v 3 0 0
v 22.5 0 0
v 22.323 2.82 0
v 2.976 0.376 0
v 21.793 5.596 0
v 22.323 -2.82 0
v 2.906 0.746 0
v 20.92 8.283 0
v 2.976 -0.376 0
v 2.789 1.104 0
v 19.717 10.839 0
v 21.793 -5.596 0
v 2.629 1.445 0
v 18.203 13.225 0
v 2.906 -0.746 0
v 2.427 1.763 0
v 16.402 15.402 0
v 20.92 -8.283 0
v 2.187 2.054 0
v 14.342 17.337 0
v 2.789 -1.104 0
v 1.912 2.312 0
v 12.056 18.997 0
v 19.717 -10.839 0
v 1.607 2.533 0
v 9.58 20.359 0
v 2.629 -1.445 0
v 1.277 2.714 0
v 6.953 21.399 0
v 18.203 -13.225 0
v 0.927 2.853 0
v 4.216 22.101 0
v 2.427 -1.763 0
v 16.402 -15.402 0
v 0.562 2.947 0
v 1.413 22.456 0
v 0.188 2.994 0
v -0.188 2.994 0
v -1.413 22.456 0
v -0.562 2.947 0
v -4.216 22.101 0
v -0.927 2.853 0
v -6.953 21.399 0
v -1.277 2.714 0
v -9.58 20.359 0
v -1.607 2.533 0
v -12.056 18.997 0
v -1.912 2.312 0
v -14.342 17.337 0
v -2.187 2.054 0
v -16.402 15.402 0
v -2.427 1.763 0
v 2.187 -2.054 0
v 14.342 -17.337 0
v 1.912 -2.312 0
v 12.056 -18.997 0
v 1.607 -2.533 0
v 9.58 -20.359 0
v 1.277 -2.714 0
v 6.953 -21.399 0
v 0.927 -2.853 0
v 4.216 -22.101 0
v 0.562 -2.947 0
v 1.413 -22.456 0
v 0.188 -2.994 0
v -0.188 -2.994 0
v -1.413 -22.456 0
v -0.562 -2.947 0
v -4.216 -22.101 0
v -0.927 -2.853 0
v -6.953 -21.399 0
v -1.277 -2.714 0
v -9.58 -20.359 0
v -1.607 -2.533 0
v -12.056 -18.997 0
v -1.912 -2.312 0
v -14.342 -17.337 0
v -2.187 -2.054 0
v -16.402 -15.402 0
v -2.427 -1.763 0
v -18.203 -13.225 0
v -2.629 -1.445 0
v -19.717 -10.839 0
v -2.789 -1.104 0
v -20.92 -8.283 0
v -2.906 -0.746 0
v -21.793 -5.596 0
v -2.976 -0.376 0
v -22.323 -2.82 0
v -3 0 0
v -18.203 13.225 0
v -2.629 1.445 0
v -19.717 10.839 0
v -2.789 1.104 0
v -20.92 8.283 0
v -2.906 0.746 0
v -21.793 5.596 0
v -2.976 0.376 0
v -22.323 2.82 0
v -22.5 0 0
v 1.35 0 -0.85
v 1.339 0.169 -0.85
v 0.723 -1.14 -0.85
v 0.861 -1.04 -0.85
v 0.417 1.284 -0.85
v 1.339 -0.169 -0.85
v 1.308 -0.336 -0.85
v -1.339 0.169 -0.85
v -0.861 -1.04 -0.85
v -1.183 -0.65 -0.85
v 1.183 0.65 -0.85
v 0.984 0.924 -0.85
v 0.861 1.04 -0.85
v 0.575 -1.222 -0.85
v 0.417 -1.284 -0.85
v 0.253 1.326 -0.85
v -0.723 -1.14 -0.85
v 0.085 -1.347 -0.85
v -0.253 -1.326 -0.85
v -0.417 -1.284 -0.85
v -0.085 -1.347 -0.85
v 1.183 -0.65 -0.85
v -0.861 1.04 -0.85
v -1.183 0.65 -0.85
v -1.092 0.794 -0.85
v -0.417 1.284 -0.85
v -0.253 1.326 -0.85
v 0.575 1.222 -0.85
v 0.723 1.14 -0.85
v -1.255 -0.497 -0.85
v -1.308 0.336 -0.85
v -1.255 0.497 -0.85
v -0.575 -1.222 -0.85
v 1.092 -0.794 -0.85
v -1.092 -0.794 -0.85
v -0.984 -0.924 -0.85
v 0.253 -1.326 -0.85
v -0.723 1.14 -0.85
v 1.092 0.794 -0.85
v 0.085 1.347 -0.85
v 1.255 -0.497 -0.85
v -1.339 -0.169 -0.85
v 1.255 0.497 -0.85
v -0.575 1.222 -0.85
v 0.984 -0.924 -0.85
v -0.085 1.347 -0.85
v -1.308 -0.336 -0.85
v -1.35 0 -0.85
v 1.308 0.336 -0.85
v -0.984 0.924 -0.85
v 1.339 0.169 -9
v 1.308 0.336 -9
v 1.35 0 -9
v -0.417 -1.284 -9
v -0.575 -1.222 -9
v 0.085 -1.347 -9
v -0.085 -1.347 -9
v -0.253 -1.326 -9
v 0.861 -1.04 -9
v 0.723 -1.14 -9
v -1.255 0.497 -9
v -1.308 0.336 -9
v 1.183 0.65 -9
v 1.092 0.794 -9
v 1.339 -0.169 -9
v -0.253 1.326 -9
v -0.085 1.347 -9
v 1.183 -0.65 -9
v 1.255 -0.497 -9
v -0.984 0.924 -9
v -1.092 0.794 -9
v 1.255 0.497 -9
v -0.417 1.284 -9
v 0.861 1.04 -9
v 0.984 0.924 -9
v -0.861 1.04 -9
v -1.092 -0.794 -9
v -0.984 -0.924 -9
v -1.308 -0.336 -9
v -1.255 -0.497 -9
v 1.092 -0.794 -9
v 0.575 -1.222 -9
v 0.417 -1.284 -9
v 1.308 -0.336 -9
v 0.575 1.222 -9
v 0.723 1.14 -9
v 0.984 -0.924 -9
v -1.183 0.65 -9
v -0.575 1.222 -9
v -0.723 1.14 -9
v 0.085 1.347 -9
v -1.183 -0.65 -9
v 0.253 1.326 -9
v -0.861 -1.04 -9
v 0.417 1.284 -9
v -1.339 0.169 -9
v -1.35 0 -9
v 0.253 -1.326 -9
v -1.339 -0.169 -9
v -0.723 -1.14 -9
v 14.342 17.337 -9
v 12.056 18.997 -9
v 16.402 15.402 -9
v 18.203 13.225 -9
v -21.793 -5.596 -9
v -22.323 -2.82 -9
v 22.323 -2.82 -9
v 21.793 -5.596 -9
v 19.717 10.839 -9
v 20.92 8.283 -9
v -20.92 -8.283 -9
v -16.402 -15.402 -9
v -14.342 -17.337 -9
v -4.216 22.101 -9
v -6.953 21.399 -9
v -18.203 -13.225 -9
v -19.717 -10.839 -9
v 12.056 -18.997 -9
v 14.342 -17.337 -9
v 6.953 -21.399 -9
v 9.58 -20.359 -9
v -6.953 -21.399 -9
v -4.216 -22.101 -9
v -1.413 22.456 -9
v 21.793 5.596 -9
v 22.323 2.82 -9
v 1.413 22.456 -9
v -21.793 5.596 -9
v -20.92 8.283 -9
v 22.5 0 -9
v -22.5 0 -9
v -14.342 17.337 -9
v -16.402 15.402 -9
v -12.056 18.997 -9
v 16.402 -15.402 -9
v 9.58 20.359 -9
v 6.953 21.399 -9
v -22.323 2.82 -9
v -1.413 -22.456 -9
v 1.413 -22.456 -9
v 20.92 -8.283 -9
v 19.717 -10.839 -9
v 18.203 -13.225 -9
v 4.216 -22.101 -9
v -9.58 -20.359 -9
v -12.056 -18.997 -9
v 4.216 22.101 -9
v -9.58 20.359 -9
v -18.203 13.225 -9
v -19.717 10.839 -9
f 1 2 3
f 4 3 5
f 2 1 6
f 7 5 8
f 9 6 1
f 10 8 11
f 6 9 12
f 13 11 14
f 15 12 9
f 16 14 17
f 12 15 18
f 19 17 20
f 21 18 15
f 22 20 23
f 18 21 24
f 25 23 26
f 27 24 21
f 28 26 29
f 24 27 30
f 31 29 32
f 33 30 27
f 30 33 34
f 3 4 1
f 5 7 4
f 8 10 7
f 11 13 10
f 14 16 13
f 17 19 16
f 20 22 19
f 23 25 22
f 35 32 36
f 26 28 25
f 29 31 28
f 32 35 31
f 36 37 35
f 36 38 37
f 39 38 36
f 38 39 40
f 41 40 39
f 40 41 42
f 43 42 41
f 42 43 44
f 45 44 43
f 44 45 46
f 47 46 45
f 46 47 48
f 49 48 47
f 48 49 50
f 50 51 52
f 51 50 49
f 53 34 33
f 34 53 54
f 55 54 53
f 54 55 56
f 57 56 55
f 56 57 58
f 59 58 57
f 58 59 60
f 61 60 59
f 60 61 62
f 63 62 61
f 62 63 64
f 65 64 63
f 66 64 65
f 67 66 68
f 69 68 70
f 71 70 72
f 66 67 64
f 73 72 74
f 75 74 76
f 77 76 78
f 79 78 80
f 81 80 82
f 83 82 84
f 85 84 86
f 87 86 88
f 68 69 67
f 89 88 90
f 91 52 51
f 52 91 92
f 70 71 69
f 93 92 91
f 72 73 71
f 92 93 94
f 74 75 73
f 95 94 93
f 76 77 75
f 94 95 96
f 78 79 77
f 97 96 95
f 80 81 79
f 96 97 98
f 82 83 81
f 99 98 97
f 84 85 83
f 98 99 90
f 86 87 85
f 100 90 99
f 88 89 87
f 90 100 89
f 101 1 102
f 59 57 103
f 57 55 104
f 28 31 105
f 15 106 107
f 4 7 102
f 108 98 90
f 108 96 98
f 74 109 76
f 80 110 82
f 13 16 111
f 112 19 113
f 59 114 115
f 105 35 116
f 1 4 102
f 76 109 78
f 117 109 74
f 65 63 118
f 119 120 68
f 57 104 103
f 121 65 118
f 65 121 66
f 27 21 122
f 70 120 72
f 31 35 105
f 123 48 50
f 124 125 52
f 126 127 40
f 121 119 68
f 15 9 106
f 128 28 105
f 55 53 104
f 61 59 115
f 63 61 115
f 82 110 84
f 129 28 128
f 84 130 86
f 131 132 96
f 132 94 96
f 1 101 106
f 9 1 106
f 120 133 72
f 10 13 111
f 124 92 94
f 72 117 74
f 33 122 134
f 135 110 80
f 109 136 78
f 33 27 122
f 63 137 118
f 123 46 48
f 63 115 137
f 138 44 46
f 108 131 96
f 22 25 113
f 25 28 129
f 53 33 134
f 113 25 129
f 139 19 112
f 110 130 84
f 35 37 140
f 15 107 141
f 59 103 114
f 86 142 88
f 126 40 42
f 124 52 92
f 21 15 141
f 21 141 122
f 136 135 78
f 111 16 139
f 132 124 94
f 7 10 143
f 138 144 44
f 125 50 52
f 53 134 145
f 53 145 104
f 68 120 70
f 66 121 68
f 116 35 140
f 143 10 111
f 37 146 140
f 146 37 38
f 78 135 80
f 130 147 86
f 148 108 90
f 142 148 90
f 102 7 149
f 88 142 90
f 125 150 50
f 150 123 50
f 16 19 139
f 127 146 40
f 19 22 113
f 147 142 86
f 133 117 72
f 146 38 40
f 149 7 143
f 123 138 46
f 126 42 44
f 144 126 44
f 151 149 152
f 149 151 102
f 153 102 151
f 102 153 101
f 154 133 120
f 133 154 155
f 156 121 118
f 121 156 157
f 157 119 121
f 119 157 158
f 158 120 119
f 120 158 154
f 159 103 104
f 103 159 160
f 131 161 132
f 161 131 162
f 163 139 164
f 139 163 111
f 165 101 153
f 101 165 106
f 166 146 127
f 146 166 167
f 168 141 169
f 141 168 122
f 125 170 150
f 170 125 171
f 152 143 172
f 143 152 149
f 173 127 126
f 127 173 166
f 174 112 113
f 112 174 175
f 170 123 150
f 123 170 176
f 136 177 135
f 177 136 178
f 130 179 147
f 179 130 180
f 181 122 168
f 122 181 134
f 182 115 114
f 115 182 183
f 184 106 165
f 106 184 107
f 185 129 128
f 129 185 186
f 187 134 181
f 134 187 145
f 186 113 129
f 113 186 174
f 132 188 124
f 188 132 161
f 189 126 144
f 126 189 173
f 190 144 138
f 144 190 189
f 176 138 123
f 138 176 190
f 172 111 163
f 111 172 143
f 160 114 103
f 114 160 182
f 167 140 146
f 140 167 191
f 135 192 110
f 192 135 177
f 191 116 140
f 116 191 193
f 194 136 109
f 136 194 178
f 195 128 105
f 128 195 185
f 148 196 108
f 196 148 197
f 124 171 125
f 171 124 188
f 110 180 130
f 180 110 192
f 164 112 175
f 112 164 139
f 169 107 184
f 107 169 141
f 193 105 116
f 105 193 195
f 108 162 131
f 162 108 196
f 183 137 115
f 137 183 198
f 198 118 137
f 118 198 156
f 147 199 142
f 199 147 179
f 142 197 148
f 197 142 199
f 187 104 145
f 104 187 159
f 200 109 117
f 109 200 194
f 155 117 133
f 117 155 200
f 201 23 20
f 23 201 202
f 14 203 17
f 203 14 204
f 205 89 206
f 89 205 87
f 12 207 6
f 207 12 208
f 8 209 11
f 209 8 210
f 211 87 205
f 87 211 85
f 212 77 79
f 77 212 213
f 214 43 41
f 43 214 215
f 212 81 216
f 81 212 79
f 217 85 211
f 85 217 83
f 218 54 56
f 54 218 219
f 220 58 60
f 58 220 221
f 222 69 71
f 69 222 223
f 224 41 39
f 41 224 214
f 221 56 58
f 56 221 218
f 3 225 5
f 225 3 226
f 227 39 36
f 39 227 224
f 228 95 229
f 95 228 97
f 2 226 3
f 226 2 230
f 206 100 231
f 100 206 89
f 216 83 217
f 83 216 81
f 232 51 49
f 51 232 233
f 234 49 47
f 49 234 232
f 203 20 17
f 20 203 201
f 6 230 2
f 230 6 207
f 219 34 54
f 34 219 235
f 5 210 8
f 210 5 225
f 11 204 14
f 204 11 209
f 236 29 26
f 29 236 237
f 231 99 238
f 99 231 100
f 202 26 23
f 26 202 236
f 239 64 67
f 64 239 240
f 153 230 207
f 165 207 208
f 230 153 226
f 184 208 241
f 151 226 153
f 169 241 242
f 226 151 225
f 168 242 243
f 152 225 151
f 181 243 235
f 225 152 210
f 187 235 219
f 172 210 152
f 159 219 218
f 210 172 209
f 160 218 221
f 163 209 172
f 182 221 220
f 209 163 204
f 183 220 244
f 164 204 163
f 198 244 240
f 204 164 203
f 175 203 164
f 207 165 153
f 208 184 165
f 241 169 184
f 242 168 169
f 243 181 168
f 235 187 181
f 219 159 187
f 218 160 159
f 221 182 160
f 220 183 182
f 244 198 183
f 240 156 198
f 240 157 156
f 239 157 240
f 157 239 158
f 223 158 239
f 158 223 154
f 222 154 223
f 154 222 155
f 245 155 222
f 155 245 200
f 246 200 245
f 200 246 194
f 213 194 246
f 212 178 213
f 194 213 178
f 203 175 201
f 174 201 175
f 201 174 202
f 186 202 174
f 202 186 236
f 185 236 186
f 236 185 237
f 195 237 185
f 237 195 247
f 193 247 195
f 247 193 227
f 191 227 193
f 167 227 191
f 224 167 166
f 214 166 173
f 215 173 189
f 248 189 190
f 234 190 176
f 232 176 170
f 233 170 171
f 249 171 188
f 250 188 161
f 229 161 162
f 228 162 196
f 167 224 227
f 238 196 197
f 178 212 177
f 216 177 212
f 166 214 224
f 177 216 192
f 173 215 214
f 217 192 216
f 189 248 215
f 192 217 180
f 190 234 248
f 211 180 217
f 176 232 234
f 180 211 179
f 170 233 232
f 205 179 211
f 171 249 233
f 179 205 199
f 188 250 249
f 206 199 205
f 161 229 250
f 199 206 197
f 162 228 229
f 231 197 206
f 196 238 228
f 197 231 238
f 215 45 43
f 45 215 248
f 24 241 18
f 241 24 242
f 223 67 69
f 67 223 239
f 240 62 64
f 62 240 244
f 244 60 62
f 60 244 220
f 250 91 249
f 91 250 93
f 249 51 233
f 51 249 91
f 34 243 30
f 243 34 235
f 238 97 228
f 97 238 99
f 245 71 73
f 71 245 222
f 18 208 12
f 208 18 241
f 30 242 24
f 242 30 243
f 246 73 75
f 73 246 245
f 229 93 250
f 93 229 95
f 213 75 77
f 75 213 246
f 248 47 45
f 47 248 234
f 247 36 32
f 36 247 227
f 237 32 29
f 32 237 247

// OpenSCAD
$fn = 50;

difference() {
	union() {
		translate(v = [0, 0, -9.0]) {
			cylinder(h = 9, r = 22.5);
		}
	}
	union() {
		translate(v = [0, 0, 0]) {
			rotate(a = [0, 0, 0]) {
				difference() {
					union() {
						translate(v = [0, 0, -12.0]) {
							cylinder(h = 12, r = 1.0);
						}
						translate(v = [0, 0, -0.85]) {
							cylinder(h = 0.85, r1 = 1.35, r2 = 3.0);
						}
						translate(v = [0, 0, -12.0]) {
							cylinder(h = 12, r = 1.35);
						}
						translate(v = [0, 0, -12.0]) {
							cylinder(h = 12, r = 1.0);
						}
					}
					union();
				}
			}
		}
	}
}
